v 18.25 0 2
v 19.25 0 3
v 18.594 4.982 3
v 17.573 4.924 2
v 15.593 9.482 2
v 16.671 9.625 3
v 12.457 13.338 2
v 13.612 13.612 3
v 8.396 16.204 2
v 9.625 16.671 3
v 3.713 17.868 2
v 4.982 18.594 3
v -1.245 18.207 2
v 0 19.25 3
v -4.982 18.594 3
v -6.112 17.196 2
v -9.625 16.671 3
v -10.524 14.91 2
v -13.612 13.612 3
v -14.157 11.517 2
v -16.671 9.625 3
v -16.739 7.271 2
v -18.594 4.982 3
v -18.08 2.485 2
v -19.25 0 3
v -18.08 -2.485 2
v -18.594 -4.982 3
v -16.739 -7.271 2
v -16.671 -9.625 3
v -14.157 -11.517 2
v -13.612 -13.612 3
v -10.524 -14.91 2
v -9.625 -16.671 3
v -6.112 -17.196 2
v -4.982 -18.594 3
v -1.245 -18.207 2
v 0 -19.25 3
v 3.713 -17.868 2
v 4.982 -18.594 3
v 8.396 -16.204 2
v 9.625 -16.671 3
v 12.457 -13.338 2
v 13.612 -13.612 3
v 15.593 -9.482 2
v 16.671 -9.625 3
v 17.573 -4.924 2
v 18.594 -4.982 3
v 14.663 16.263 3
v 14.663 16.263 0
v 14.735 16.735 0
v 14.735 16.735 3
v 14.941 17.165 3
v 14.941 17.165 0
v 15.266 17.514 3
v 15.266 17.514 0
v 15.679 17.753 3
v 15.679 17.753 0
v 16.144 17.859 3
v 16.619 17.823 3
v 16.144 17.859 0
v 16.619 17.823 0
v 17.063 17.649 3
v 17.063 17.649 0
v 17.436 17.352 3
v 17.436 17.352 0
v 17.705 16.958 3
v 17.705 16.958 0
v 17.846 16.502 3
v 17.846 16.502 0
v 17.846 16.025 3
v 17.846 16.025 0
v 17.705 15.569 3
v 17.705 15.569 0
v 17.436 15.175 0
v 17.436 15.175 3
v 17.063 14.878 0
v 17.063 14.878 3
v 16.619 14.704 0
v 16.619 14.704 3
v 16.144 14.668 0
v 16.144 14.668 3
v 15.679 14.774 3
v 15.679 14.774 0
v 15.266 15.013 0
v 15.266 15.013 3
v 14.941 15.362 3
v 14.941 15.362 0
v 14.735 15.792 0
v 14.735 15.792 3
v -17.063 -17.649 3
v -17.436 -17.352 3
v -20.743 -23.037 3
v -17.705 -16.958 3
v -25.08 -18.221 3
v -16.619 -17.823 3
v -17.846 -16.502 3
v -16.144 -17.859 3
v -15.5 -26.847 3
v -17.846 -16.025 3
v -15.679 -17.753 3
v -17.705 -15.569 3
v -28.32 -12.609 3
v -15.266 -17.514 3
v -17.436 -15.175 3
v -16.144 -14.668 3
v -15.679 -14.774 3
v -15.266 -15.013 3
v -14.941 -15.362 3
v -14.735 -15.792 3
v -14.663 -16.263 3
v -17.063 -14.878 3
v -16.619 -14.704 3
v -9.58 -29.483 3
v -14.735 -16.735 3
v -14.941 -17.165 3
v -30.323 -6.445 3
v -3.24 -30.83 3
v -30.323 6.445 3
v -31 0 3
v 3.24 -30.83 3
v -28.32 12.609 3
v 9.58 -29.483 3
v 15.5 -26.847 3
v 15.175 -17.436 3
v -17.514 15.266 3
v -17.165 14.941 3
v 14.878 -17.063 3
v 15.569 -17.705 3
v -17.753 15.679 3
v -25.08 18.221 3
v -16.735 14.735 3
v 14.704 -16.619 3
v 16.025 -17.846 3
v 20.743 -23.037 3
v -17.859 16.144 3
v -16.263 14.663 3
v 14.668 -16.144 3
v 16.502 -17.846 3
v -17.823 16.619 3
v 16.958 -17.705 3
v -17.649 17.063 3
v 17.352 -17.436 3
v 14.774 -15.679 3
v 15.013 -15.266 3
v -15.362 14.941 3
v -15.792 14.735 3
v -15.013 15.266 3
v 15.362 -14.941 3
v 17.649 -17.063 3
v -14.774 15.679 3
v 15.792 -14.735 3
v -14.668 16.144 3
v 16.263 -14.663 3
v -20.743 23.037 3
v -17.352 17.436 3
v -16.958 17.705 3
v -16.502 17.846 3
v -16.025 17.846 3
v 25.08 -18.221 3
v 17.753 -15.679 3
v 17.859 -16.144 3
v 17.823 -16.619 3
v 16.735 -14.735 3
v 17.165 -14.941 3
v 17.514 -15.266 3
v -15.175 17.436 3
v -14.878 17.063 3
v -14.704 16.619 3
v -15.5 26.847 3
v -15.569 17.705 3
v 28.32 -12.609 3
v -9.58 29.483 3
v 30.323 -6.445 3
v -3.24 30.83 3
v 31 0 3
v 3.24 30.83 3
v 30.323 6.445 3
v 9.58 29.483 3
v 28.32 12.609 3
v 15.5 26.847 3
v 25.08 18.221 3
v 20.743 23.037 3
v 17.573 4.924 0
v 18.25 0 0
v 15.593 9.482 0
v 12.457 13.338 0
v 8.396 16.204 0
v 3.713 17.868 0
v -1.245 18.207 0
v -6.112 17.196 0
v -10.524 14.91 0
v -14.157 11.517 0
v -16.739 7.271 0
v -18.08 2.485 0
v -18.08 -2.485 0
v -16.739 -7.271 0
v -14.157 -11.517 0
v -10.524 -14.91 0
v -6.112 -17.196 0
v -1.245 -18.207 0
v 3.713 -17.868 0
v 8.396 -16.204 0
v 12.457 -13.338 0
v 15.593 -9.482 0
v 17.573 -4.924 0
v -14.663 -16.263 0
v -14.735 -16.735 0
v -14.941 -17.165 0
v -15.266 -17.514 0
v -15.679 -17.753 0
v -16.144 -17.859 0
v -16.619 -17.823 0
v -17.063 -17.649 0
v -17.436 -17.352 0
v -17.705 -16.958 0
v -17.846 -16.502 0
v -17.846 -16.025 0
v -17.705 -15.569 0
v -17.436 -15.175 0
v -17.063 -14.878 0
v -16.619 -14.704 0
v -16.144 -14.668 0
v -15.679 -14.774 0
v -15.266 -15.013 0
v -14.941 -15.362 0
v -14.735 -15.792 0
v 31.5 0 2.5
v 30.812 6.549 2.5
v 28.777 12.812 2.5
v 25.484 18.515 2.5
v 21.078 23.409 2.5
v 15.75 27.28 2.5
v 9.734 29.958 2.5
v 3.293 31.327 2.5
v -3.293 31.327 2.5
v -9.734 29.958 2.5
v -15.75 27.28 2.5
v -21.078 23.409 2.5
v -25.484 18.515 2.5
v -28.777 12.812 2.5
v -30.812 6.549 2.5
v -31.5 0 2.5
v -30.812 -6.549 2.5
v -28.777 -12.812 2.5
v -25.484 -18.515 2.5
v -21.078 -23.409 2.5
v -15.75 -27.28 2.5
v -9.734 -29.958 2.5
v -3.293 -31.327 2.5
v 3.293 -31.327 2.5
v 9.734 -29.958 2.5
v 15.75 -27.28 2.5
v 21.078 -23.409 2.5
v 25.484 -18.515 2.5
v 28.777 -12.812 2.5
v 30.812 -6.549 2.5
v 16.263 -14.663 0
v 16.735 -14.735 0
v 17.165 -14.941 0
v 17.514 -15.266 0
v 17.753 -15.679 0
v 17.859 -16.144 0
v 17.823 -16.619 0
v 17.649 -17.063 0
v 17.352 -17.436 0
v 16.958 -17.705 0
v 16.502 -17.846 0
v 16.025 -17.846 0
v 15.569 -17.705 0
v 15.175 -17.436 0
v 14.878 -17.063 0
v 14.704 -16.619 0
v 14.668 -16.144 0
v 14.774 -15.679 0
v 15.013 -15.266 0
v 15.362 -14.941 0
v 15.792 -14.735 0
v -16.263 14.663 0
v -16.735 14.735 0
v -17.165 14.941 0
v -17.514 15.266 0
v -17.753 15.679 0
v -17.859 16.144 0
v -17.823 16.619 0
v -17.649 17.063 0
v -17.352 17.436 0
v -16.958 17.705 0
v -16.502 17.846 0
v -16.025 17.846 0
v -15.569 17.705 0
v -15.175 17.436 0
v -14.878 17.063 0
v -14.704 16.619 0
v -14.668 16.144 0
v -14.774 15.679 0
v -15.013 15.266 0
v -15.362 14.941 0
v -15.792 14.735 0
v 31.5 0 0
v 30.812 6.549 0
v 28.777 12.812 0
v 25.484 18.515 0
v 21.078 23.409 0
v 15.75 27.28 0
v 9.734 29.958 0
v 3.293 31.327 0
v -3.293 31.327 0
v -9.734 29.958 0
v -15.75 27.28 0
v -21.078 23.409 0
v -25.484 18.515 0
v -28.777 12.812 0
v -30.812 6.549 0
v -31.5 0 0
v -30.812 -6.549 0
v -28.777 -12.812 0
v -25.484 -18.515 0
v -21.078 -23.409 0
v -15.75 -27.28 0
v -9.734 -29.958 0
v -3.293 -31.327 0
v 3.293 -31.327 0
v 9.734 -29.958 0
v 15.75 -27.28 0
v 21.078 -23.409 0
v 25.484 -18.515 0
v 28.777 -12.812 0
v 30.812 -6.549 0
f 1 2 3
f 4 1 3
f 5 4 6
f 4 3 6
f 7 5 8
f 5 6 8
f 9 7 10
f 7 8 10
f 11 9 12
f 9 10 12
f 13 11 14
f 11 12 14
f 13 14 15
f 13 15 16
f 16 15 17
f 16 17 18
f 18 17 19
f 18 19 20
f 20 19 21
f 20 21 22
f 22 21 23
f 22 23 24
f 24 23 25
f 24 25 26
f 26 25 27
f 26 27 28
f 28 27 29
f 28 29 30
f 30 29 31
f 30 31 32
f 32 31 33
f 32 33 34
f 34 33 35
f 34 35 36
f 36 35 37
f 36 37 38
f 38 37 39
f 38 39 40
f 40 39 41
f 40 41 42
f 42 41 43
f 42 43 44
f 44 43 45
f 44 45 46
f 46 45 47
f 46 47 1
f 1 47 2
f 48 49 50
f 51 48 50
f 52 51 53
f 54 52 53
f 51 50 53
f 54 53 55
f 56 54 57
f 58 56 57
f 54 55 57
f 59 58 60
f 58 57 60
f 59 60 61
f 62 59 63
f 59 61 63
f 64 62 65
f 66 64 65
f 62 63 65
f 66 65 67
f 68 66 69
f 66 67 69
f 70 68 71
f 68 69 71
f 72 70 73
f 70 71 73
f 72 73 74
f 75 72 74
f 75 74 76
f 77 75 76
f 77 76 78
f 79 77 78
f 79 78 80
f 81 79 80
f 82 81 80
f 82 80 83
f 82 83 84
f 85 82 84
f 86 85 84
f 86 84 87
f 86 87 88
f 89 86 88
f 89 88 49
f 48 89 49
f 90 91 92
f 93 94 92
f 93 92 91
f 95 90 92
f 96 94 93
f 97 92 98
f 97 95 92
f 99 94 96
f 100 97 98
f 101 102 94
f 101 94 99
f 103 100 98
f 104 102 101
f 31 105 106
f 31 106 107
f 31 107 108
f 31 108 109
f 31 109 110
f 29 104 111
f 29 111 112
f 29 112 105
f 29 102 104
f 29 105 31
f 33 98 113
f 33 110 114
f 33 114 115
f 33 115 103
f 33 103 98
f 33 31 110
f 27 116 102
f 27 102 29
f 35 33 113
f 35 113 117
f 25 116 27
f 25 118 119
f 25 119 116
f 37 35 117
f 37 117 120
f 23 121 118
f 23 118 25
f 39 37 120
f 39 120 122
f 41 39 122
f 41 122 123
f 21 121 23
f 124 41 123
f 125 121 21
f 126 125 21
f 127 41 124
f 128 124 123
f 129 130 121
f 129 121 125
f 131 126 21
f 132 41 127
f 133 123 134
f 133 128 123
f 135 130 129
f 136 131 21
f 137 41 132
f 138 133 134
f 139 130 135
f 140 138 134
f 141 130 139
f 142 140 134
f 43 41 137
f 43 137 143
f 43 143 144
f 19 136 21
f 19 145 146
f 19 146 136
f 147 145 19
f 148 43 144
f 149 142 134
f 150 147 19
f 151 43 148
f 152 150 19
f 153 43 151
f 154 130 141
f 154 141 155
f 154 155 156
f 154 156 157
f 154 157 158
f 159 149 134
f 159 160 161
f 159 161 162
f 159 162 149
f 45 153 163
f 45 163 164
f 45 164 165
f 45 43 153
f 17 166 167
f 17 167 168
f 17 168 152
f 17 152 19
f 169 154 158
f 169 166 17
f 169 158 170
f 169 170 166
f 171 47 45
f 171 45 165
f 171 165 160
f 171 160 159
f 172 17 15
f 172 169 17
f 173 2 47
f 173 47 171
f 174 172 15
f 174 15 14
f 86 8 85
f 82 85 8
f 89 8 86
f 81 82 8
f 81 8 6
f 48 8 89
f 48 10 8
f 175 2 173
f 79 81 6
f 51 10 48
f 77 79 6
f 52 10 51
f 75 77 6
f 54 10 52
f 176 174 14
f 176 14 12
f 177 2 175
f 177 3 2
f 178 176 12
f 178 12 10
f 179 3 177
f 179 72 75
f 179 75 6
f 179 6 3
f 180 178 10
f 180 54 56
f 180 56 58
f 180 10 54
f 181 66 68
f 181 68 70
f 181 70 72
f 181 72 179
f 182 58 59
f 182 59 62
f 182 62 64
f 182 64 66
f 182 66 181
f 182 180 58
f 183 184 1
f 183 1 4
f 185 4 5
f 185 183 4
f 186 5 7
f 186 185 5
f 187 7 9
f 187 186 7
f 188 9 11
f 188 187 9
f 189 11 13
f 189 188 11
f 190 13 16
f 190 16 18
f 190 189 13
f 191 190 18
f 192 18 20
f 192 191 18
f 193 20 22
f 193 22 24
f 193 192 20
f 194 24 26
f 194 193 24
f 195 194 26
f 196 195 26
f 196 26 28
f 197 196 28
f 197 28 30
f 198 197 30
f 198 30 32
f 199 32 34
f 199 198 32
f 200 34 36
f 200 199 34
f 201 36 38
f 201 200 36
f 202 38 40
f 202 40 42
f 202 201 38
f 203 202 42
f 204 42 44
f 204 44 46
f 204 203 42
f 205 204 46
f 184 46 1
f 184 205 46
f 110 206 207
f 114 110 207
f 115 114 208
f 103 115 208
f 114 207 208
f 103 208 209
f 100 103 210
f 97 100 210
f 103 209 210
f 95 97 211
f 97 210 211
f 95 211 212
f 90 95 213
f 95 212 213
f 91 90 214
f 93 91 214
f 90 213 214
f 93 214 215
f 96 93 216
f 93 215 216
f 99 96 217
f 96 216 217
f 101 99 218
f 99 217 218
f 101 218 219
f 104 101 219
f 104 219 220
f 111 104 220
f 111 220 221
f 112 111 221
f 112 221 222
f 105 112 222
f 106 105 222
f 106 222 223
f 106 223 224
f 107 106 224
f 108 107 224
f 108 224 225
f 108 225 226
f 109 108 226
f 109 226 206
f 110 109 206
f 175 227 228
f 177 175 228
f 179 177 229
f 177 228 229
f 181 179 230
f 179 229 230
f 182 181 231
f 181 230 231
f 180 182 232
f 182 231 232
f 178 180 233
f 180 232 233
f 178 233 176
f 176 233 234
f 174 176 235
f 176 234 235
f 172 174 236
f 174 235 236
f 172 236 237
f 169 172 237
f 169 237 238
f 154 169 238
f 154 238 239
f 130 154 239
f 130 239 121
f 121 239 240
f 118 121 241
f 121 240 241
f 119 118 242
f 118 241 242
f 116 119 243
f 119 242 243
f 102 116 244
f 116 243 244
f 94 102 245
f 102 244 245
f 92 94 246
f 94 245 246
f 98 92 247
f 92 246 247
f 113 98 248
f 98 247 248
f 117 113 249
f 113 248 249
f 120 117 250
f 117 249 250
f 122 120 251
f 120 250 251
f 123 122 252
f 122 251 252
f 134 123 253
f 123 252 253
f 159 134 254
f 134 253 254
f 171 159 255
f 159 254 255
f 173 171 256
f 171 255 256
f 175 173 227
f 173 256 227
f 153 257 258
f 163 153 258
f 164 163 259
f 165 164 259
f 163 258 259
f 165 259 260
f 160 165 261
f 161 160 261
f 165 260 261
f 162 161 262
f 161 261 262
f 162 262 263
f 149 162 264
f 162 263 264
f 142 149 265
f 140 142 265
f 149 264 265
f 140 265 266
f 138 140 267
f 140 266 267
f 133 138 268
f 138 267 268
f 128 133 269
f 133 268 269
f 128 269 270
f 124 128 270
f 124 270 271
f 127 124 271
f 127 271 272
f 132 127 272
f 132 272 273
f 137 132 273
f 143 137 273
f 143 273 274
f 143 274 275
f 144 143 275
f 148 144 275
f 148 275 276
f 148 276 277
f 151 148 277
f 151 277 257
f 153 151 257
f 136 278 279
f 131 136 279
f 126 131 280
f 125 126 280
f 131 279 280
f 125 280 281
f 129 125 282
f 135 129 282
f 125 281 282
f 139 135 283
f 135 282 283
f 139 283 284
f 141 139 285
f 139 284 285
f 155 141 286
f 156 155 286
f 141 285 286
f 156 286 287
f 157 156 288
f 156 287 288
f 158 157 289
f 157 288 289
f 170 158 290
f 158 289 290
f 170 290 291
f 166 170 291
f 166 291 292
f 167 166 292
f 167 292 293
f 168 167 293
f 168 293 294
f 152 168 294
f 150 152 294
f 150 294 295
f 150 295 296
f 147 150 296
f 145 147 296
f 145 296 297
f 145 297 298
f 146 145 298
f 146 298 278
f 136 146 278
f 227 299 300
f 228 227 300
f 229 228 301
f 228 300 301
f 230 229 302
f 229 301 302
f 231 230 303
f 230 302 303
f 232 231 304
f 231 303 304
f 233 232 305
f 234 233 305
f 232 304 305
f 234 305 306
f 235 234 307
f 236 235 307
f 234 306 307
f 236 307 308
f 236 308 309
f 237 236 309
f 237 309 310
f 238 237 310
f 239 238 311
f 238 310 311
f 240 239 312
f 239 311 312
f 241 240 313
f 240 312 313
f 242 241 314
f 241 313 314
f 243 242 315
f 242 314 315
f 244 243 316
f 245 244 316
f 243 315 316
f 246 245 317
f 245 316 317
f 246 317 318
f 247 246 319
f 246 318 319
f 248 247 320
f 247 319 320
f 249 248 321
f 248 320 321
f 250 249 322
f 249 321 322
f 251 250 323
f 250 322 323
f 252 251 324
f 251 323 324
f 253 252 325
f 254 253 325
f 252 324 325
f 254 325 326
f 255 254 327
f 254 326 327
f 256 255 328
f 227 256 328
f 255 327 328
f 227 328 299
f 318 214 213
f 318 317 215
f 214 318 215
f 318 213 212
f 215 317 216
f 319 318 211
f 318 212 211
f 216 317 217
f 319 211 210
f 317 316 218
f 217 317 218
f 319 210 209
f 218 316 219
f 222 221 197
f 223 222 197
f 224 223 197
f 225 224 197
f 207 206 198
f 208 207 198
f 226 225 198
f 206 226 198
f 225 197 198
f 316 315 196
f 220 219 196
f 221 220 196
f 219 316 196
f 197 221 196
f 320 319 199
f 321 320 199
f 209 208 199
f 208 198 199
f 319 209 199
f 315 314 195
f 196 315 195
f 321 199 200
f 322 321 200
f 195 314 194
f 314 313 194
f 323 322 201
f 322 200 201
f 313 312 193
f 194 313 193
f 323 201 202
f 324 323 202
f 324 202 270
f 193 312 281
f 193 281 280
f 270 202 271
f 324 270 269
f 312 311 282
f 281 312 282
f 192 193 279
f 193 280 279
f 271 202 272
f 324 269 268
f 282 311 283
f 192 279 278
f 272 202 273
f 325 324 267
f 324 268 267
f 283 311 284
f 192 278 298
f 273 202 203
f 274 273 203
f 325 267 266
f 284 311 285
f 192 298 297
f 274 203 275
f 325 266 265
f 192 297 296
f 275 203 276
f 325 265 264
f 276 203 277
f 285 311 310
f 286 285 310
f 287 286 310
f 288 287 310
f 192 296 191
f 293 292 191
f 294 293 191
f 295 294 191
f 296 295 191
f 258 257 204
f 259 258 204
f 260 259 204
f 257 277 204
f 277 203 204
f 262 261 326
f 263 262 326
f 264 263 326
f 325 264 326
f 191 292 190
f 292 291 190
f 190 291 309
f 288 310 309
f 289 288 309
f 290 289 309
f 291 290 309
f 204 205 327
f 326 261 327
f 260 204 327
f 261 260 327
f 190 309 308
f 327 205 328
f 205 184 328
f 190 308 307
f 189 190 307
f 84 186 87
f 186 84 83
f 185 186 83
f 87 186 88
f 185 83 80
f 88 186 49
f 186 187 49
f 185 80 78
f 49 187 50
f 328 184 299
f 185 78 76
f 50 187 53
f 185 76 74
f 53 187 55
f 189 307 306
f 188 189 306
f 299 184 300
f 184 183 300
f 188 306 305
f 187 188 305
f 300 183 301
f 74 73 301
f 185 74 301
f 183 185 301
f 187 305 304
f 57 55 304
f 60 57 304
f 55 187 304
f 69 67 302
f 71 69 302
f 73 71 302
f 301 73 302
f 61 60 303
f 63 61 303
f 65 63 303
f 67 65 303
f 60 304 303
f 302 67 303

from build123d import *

# Parameters (mm, degrees)
SKETCH_1_R               = 31.5
SKETCH_1_R_2             = 18.25
EXTRUDE_1_DEPTH          = 3
CHAMFER_2_SIZE           = 1
CHAMFER_3_SIZE           = 0.5
SKETCH_2_R               = 1.6
CUT_EXTRUDE_1_DEPTH      = 45.648628198
PATTERN_CIRCULAR_1_COUNT = 4


with BuildPart() as part:
    # Эскиз1 → Бобышка-Вытянуть1 (new body)
    with BuildSketch(Plane.XY):
        Circle(SKETCH_1_R)
        Circle(SKETCH_1_R_2, mode=Mode.SUBTRACT)
    extrude(amount=EXTRUDE_1_DEPTH)

    # Фаска2
    chamfer_2_edges = [part.edges().sort_by_distance(p)[0] for p in [
        (-18.25, 0, 3),
    ]]
    chamfer(chamfer_2_edges, length=CHAMFER_2_SIZE)

    # Фаска3
    chamfer_3_edges = [part.edges().sort_by_distance(p)[0] for p in [
        (-31.5, 0, 3),
    ]]
    chamfer(chamfer_3_edges, length=CHAMFER_3_SIZE)

    # Эскиз2 → Вырез-Вытянуть1 (cut, through all)
    with BuildSketch(Plane(origin=(0, 0, 0), x_dir=(-1, 0, 0), z_dir=(0, 0, -1))):
        with Locations((-16.263455967, 16.263455967)):
            Circle(SKETCH_2_R)
    cut_extrude_1 = extrude(amount=-CUT_EXTRUDE_1_DEPTH, mode=Mode.SUBTRACT)

    # Круговой массив1: Вырез-Вытянуть1 ×4 about axis
    pattern_circular_1_axis = Axis((0, 0, 2), (0, 0, -1))
    for i in range(1, PATTERN_CIRCULAR_1_COUNT):
        add(cut_extrude_1.rotate(pattern_circular_1_axis, i * 360 / PATTERN_CIRCULAR_1_COUNT), mode=Mode.SUBTRACT)


solid = part.part
